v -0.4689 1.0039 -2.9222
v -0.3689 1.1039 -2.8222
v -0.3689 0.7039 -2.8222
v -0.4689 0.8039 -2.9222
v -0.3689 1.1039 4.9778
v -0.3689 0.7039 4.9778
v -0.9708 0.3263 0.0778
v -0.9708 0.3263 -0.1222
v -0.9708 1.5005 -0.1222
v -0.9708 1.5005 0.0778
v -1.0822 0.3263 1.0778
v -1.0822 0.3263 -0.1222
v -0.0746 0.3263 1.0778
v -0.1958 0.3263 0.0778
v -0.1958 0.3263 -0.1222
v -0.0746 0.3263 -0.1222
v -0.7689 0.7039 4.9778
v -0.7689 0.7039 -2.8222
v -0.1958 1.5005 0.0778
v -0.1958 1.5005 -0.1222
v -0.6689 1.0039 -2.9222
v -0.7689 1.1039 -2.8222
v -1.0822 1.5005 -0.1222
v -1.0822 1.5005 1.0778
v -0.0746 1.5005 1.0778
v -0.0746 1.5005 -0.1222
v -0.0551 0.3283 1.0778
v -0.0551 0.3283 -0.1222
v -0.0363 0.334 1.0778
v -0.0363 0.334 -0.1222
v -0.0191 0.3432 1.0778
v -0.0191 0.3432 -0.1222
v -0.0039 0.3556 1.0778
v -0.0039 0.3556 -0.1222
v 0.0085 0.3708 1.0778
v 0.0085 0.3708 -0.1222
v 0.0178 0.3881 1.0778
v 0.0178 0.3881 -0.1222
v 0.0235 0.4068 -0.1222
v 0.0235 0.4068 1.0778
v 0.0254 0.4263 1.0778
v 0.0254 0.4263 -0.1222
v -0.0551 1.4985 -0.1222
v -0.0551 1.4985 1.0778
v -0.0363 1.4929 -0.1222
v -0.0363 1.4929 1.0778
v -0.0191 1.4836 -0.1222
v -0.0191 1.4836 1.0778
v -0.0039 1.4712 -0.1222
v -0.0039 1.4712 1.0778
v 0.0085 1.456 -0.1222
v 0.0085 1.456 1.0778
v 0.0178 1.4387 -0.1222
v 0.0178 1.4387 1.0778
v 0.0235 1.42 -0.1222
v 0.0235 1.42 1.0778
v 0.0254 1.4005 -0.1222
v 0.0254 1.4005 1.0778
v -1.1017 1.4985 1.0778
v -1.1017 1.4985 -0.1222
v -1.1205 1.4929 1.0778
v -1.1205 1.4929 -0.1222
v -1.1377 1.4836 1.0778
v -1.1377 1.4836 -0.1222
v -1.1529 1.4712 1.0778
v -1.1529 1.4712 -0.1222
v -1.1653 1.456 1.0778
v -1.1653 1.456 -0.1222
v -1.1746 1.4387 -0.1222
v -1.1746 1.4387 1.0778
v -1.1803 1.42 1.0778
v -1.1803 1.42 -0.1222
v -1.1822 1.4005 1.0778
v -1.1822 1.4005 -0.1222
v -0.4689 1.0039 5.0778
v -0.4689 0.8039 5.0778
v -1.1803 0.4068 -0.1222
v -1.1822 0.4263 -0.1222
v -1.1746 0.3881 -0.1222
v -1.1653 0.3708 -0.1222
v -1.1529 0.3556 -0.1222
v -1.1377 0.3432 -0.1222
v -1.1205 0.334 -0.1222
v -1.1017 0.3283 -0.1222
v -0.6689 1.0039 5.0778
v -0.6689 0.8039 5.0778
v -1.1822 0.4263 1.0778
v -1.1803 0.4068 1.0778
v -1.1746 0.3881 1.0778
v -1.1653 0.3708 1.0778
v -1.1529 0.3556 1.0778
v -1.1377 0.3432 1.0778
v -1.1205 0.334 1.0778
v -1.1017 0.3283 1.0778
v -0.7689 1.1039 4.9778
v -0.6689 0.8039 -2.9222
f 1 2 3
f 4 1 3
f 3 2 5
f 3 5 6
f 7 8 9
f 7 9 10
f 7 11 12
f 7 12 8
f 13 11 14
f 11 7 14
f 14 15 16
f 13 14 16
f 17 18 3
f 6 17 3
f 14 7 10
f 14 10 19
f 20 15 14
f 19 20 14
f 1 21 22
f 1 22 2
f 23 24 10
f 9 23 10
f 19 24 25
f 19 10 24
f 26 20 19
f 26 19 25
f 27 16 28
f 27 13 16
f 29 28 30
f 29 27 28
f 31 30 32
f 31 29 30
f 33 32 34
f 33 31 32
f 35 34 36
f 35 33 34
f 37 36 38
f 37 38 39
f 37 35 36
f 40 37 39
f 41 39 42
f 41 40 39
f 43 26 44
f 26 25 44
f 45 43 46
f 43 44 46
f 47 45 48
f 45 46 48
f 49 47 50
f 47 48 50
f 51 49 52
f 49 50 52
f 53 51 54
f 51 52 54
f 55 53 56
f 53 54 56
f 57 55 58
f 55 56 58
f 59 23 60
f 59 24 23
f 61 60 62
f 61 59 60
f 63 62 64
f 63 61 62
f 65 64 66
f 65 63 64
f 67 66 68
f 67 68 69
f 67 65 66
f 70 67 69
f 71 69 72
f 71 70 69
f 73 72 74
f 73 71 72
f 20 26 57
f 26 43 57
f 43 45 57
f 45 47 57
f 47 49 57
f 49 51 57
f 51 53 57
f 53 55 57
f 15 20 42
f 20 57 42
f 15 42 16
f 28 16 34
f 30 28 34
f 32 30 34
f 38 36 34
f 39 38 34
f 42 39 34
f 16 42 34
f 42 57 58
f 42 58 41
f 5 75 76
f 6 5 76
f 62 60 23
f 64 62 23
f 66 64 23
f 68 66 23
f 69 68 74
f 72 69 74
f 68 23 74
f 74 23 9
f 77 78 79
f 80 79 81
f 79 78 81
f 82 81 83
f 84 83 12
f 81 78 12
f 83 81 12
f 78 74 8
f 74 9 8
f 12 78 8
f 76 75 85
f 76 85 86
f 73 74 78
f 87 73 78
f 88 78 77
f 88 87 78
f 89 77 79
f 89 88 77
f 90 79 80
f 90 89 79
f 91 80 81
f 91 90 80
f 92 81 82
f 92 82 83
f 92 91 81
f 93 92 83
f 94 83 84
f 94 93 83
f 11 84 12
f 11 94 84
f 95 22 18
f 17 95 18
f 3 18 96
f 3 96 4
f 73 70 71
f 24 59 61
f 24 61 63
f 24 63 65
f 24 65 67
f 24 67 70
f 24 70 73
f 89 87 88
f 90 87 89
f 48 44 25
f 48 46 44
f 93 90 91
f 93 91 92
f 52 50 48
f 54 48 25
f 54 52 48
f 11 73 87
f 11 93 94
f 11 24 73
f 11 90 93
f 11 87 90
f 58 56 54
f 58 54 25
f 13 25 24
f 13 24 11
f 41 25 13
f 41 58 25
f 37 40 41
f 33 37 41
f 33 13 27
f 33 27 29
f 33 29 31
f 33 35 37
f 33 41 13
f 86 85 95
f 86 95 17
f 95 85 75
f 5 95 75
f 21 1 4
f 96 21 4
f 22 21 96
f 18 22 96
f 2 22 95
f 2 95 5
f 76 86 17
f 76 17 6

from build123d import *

# Parameters (mm, degrees)
SKETCH1_W                = 1.174125683
SKETCH1_H                = 1.207575088
BOSS_EXTRUDE1_DEPTH      = 1.2
FILLET8_R                = 0.1
SKETCH2_W                = 0.775
SKETCH2_H                = 0.2
CUT_EXTRUDE2_DEPTH       = 1.2
BOSS_EXTRUDE8_DEPTH      = 4
BOSS_EXTRUDE8_DEPTH_BACK = 4
SKETCH7_W                = 0.4
SKETCH7_H                = 0.4
CHAMFER1_SIZE            = 0.1
CHAMFER2_SIZE            = 0.1
BODY_MOVE_COPY3_ANGLE    = 120


with BuildPart() as part:
    # Sketch1 → Boss-Extrude1 (new body)
    with BuildSketch(Plane(origin=(0, 0, 0.178765275), x_dir=(1, 0, 0), z_dir=(0, 1, 0))):
        with Locations((-0.587062841, -0.603787544)):
            Rectangle(SKETCH1_W, SKETCH1_H)
    extrude(amount=BOSS_EXTRUDE1_DEPTH)

    # Fillet8
    fillet8_edges = [part.edges().sort_by_distance(p)[0] for p in [
        (0, 0.6, 1.386340362),
        (-1.174125683, 0.6, 1.386340362),
        (-1.174125683, 0.6, 0.178765275),
        (0, 0.6, 0.178765275),
    ]]
    fillet(fillet8_edges, radius=FILLET8_R)

    # Sketch2 → Cut-Extrude2 (cut)
    with BuildSketch(Plane(origin=(0, 0, 0), x_dir=(0, 0, -1), z_dir=(1, 0, 0))):
        with Locations((-0.7875, 0.1)):
            Rectangle(SKETCH2_W, SKETCH2_H)
    extrude(amount=-CUT_EXTRUDE2_DEPTH, mode=Mode.SUBTRACT)


with BuildPart() as body_2:
    # Sketch7 → Boss-Extrude8 (new, two sides: drawn at the far end of the back side and taken through both)
    with BuildSketch(Plane(origin=(0, 1.2, 0), x_dir=(1, 0, 0), z_dir=(0, 1, 0)).offset(-BOSS_EXTRUDE8_DEPTH_BACK)):
        with Locations((-0.56024756, -0.773060748)):
            Rectangle(SKETCH7_W, SKETCH7_H)
    extrude(amount=BOSS_EXTRUDE8_DEPTH + BOSS_EXTRUDE8_DEPTH_BACK)

    # Chamfer1
    chamfer1_edges = [body_2.edges().sort_by_distance(p)[0] for p in [
        (-0.76024756, 5.2, 0.773060748),
        (-0.56024756, 5.2, 0.973060748),
        (-0.36024756, 5.2, 0.773060748),
        (-0.56024756, 5.2, 0.573060748),
    ]]
    chamfer(chamfer1_edges, length=CHAMFER1_SIZE)

    # Chamfer2
    chamfer2_edges = [body_2.edges().sort_by_distance(p)[0] for p in [
        (-0.36024756, -2.8, 0.773060748),
        (-0.56024756, -2.8, 0.573060748),
        (-0.76024756, -2.8, 0.773060748),
        (-0.56024756, -2.8, 0.973060748),
    ]]
    chamfer(chamfer2_edges, length=CHAMFER2_SIZE)


with BuildPart() as body_2_1:
    # Body-Move/Copy3: moved
    add(body_2.part.moved(Location((0, 0, 0))).rotate(Axis((0.176832127, 0.149512672, 0.027319455), (0.5773502691901439, -0.5773502691895168, -0.5773502691892166)), BODY_MOVE_COPY3_ANGLE))


with BuildPart() as part_1:
    # Body-Move/Copy3: moved
    add(part.part.moved(Location((0, 0, 0))).rotate(Axis((0.176832127, 0.149512672, 0.027319455), (0.5773502691901439, -0.5773502691895168, -0.5773502691892166)), BODY_MOVE_COPY3_ANGLE))


with BuildPart() as body_2_2:
    # Body-Move/Copy4: moved
    add(body_2_1.part.moved(Location((0, 0.017319625, 0))))


solid = Compound([part_1.part, body_2_2.part])
